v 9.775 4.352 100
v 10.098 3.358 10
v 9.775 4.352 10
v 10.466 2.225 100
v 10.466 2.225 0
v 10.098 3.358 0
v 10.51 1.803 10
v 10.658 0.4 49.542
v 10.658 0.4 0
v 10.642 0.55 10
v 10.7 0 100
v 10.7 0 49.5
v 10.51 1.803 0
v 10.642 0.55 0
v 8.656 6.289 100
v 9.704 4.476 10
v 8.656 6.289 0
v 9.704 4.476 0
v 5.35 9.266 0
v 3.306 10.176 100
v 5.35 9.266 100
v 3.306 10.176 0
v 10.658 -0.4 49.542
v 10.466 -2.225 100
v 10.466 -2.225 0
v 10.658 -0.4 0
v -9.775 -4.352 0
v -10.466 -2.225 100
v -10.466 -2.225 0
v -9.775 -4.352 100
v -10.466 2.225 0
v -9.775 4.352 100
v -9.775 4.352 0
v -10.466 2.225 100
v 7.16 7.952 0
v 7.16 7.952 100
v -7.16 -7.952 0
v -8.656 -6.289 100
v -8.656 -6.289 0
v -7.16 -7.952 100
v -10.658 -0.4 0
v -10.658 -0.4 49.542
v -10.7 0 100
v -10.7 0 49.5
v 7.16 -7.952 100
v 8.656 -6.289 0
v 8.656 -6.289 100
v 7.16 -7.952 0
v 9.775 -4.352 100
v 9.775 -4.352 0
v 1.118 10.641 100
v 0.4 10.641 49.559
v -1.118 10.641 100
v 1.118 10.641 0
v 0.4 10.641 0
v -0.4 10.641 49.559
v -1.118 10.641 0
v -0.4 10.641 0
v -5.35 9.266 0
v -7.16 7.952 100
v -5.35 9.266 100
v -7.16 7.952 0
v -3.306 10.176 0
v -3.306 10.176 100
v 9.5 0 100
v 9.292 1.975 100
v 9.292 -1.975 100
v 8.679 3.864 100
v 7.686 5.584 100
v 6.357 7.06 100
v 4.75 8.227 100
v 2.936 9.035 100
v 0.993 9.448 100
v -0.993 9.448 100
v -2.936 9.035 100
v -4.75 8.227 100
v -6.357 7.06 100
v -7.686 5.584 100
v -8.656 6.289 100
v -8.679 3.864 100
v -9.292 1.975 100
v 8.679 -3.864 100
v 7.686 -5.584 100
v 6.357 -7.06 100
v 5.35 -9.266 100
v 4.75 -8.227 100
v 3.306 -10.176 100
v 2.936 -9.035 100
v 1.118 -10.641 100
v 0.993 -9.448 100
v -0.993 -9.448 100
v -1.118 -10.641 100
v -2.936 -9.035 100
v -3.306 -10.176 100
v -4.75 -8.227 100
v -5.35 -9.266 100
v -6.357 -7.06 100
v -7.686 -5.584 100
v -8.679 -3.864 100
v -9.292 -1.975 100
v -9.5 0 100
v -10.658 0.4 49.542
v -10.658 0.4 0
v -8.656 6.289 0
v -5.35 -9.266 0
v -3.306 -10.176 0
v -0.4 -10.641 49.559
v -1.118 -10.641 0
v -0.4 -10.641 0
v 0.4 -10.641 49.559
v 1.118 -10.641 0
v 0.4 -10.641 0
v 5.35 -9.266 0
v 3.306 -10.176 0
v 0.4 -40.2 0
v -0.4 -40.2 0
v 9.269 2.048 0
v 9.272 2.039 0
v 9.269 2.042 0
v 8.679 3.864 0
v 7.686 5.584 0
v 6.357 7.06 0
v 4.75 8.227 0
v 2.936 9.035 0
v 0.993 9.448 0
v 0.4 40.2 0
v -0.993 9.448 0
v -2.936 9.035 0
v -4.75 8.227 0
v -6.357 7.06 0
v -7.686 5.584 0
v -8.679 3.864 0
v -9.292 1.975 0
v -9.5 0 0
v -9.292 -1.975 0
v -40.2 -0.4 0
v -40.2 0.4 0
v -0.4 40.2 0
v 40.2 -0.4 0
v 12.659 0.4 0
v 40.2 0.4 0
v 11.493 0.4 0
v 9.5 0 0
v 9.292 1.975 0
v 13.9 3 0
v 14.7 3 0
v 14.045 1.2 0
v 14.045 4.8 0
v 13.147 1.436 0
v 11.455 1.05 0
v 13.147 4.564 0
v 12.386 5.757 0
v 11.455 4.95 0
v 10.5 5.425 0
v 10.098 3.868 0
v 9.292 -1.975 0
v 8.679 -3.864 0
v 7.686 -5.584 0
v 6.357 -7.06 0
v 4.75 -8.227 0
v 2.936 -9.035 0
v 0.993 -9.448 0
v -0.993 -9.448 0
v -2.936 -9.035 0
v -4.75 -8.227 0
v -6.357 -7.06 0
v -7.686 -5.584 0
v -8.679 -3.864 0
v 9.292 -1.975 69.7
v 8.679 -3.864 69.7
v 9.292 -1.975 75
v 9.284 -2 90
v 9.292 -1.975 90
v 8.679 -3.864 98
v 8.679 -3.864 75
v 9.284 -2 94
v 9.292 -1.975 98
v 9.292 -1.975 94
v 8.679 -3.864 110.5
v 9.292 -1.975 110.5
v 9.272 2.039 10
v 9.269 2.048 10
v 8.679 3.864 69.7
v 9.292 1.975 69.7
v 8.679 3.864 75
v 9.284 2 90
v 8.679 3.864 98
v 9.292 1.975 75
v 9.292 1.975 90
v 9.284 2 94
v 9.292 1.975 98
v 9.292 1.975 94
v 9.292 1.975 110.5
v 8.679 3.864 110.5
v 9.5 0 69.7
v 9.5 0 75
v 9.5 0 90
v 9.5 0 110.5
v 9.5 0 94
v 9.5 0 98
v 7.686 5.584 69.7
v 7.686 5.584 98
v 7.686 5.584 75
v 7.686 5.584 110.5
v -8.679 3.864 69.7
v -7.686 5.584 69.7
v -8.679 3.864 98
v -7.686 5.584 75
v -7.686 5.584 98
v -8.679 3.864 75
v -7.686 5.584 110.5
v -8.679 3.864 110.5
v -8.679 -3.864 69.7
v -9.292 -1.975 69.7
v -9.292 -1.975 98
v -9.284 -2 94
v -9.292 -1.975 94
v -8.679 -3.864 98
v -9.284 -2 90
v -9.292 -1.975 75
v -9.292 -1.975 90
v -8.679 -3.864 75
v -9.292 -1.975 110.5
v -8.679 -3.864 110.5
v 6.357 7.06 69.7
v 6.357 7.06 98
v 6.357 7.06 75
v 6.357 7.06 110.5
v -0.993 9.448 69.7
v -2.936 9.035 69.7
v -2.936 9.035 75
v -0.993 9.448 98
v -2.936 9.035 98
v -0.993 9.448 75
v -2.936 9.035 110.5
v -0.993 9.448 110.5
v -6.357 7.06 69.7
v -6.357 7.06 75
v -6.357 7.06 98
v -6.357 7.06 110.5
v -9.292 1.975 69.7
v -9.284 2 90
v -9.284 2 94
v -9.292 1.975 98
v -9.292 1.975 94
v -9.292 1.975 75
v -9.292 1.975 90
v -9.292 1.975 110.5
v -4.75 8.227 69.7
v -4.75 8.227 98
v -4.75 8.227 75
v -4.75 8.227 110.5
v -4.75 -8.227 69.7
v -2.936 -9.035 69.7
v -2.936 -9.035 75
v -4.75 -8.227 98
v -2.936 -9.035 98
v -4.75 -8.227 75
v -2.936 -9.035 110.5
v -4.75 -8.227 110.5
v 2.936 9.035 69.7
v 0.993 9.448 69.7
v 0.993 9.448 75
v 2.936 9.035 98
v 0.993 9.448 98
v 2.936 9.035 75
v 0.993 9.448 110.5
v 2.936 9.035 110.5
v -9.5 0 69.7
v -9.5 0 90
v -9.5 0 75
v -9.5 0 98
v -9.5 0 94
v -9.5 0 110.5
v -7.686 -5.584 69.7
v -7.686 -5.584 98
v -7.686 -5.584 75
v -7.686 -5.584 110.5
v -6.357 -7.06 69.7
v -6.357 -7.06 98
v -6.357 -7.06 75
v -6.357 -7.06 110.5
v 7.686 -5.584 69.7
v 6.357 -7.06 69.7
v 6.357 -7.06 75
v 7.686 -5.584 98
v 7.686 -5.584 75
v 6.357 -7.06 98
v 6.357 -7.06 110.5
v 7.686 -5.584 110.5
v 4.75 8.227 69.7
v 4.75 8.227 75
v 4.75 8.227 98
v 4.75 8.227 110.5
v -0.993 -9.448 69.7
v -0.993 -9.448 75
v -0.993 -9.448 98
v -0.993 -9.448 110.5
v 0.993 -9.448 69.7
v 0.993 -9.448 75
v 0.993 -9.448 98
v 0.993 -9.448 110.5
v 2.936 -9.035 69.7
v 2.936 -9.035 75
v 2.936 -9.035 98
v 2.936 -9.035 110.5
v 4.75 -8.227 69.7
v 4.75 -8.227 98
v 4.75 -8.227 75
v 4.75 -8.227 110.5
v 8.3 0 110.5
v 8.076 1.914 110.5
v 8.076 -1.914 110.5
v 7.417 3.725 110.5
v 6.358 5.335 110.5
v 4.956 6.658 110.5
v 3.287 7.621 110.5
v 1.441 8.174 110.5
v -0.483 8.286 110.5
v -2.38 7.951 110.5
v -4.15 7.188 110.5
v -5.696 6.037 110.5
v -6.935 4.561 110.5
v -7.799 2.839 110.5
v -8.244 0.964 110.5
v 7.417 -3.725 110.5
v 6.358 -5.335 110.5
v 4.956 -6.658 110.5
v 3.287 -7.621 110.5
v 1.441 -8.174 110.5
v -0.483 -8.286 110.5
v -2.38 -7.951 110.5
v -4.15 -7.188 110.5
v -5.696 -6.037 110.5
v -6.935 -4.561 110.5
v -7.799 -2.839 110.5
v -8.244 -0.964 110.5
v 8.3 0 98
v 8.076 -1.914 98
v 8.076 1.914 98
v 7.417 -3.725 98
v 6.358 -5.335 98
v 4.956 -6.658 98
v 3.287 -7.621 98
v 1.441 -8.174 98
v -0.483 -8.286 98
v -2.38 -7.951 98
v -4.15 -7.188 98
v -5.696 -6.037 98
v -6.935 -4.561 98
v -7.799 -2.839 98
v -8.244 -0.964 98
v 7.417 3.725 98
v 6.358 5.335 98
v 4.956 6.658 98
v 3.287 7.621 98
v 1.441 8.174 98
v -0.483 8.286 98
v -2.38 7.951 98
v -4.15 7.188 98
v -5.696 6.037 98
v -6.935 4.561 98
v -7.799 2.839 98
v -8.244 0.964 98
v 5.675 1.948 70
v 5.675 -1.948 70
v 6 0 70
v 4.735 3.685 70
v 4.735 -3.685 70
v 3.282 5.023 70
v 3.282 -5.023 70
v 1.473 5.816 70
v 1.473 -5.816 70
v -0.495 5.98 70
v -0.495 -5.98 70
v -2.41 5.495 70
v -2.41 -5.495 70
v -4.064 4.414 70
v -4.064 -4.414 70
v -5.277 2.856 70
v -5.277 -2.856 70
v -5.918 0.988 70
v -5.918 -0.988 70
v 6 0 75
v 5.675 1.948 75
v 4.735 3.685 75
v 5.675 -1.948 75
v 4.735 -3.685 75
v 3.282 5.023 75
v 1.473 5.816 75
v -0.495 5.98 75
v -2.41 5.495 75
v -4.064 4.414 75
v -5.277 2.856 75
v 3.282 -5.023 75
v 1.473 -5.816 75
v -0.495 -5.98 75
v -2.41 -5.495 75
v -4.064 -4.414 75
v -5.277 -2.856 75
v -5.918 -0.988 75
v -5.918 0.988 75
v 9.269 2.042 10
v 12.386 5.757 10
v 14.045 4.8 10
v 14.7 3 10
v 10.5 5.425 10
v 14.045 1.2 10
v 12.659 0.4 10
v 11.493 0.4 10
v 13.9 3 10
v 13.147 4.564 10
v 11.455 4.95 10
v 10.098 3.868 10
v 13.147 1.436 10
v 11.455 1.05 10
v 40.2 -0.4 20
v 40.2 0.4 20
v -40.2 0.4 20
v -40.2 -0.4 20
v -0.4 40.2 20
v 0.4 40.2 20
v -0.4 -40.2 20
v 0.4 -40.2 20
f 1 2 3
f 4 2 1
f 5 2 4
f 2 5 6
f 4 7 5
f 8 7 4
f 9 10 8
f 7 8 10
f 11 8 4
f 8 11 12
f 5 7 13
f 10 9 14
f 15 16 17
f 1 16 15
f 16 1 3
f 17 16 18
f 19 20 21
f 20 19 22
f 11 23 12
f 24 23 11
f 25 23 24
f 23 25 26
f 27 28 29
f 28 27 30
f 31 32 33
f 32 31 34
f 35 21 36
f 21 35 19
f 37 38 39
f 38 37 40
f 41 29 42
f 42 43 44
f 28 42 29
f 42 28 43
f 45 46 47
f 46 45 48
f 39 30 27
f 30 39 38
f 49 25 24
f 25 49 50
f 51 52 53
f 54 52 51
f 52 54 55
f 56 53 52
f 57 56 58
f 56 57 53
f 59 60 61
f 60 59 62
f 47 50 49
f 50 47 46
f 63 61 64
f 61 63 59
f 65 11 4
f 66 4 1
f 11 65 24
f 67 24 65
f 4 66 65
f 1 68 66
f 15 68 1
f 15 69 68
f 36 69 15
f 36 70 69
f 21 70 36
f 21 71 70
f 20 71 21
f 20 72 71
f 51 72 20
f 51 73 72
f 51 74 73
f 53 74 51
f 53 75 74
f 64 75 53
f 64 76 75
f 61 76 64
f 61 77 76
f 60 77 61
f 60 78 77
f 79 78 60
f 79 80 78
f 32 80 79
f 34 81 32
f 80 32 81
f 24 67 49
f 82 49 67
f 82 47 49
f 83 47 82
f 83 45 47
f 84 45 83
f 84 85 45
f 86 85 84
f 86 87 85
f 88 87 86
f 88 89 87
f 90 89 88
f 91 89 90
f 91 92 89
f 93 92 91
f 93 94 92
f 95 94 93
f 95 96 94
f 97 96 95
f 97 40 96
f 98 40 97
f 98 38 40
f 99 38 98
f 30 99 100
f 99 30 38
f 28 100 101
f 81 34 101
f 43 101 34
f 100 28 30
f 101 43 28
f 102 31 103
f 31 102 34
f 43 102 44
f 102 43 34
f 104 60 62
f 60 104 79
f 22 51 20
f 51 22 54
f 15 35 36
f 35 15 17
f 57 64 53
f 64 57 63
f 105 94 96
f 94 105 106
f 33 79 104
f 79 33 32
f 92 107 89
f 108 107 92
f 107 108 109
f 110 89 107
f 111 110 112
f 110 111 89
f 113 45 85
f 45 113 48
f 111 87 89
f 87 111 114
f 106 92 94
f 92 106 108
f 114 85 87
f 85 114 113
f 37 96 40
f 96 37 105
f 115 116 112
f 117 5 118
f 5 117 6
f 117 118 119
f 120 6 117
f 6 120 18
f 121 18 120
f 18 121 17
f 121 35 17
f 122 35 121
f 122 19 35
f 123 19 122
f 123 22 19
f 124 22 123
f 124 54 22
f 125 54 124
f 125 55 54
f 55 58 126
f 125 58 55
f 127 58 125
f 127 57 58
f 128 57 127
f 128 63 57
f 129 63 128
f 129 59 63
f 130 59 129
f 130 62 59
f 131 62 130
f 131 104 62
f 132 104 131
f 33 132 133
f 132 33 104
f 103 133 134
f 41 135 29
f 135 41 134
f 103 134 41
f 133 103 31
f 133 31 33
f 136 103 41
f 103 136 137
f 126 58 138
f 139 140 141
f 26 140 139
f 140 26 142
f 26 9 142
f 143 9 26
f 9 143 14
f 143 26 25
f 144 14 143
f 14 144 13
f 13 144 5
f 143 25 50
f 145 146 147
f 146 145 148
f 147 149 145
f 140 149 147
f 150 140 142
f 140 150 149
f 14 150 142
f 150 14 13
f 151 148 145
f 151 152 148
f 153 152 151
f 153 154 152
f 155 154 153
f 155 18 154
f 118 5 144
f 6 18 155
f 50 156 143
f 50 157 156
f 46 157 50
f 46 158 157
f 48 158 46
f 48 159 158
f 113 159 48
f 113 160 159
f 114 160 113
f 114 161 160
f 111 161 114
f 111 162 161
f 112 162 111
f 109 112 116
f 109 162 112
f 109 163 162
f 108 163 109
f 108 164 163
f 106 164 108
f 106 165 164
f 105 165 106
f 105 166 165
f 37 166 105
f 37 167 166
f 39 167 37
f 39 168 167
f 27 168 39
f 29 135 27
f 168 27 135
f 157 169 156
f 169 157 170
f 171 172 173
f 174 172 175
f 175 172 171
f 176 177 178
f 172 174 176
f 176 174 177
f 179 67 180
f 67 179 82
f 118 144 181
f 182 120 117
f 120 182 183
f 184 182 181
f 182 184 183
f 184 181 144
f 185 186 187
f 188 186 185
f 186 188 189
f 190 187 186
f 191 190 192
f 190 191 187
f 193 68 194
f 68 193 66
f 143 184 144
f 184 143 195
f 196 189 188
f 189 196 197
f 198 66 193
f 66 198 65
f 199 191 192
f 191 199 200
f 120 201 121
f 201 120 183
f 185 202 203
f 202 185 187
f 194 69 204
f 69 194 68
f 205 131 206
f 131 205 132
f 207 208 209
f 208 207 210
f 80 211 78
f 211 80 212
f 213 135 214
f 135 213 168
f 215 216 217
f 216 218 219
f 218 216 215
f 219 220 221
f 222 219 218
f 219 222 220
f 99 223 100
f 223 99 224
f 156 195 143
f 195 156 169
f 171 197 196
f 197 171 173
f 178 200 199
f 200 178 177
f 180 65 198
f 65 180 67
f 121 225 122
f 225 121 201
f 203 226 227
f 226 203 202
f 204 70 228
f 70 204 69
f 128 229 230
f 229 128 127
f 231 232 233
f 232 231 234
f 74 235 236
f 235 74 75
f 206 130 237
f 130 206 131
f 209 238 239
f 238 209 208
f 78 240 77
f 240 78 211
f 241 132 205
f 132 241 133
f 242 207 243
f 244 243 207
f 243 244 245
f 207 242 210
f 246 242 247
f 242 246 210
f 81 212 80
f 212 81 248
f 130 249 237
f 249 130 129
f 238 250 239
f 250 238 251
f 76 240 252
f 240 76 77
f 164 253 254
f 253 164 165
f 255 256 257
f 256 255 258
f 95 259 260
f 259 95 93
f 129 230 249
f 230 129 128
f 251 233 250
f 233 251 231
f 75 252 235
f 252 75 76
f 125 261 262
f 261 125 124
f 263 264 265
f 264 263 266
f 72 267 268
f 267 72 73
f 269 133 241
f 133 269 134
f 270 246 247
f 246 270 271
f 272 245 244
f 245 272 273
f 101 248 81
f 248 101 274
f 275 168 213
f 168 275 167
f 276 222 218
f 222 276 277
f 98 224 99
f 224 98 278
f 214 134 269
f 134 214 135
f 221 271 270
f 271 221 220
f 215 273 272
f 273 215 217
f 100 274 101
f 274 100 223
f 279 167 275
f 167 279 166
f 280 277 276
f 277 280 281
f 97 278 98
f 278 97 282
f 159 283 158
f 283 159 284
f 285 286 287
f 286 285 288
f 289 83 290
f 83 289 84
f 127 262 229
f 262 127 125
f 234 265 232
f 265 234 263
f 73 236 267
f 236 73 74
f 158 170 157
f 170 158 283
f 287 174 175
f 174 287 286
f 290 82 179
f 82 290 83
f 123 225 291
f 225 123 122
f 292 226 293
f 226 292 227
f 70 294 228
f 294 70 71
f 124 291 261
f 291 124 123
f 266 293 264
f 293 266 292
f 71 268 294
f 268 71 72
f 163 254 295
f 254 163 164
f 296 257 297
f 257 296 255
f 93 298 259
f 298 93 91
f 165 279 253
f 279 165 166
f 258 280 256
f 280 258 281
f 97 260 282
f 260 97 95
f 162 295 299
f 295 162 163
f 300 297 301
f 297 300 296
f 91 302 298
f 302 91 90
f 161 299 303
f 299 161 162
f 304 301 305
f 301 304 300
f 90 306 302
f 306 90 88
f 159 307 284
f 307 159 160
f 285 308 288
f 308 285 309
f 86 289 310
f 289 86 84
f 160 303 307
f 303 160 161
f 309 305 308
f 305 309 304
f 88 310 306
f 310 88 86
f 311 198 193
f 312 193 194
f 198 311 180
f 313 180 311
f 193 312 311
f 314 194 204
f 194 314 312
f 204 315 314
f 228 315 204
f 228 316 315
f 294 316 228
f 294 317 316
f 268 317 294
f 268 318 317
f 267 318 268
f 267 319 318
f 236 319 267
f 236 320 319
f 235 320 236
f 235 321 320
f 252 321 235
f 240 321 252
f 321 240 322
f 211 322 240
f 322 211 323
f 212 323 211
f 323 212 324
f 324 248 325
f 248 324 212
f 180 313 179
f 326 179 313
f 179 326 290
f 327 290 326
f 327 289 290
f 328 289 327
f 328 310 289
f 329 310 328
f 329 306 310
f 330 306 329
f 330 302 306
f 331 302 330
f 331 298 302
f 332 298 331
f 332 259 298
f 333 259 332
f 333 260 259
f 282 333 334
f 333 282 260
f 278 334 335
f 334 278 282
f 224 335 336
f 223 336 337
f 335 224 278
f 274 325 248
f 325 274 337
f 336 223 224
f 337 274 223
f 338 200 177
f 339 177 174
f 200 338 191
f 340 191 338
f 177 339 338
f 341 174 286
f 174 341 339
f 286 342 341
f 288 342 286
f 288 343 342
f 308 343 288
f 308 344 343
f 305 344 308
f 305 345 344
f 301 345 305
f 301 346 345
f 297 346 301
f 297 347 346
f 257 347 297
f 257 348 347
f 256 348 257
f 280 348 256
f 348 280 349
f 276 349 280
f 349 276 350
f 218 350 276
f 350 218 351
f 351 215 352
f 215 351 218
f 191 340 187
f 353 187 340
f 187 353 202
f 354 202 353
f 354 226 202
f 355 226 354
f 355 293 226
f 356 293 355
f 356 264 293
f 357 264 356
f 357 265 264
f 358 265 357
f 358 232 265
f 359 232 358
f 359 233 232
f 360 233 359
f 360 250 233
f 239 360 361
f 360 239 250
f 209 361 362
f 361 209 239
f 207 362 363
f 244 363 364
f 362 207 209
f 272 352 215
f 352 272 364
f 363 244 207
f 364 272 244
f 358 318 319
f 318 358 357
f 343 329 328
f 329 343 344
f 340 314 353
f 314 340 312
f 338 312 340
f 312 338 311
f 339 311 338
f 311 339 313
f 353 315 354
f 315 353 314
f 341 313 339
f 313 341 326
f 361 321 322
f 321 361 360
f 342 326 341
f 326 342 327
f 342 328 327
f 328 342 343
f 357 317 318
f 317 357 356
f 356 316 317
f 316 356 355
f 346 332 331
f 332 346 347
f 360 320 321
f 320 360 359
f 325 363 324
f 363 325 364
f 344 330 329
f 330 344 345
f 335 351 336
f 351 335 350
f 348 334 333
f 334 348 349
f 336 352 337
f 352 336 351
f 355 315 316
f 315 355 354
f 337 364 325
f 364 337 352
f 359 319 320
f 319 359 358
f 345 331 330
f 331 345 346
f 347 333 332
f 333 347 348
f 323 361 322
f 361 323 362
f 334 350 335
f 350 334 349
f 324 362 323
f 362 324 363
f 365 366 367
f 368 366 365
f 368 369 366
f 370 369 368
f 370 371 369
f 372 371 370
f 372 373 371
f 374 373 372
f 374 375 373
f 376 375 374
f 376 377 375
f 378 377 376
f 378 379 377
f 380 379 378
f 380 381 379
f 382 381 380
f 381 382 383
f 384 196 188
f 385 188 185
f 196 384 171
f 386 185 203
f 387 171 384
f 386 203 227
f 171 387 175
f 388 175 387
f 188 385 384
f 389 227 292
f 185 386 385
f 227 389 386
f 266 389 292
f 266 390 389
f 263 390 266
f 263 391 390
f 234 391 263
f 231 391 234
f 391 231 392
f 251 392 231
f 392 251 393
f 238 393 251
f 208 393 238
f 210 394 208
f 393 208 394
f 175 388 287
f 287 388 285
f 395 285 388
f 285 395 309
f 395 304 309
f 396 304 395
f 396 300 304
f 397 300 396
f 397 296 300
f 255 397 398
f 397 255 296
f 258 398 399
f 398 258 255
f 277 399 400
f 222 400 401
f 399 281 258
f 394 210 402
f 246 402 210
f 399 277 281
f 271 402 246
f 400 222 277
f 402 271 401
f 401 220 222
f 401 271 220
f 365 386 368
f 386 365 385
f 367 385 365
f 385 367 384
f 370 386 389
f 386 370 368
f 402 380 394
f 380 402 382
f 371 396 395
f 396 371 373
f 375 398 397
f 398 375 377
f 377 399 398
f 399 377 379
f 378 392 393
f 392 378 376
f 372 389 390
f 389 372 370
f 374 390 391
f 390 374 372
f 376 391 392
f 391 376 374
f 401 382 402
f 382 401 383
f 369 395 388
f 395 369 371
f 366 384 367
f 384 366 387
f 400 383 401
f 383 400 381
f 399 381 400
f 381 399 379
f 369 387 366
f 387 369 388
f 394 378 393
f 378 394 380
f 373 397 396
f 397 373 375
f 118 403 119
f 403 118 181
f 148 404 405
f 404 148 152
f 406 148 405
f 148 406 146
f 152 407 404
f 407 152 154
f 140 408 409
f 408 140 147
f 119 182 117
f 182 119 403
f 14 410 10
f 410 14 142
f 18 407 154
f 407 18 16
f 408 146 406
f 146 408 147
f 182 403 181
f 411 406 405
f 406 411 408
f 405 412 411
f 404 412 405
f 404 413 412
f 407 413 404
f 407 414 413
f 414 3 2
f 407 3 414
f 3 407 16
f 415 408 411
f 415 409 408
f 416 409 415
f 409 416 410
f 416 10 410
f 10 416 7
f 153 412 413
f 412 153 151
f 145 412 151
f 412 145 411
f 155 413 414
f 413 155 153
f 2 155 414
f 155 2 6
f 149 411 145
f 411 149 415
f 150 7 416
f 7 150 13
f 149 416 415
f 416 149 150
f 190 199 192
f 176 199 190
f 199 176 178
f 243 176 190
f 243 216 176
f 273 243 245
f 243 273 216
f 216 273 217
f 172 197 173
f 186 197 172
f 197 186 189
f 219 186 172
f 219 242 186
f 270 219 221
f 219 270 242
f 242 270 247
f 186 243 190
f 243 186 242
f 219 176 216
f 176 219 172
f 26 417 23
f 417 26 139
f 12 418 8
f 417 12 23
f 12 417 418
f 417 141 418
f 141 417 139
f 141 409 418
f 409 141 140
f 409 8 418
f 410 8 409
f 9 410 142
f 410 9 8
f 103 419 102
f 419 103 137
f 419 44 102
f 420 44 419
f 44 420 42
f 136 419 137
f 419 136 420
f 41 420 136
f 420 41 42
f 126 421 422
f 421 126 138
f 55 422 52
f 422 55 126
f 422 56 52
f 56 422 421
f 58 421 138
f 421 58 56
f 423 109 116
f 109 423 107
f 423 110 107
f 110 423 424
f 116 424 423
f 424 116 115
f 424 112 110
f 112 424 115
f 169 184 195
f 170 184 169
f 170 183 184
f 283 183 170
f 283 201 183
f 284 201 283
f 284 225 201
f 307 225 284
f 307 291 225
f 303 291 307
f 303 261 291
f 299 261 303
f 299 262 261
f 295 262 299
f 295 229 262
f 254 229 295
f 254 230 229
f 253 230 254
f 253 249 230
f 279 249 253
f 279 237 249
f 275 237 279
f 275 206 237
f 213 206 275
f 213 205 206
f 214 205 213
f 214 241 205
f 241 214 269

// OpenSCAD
a=100; b=10.7;
module stupen () {
    difference () {
    cylinder(a,b,b);
    translate ([0,0,-1]) cylinder (a+2,b-1.2,b-1.2);
}}

module spojkavolna () {
    difference () {
    translate ([0,0,98]) cylinder (a/8,9.5,9.5);
    translate ([0,0,97]) cylinder (a/8+2,8.3,8.3);
    }}

module zarazka () {
    difference () {
    translate ([0,0,70]) cylinder (5,9.5,9.5);
    translate ([0,0,69]) cylinder (7,6,6);
    }}
translate ([0,0,69.7]) cylinder (0.3,9.5,9.5);

module prepazka () {
    translate ([-9.5,-2,90]) cube ([19,4,4]);
}

module hand (scale=10) {
    rotate ([90,0,0]) linear_extrude(height = scale*0.08, center = true)
    polygon (points=[[0,0],[0,50],[30,20],[30,0]]);
}

module uchyt () {
    difference () {
    translate ([11.9,3,0]) cylinder (10,2.8,2.8);
    translate ([11.9,3,-1]) cylinder (12,2,2);
}}

union () {
    stupen();
    spojkavolna();
    zarazka ();
    prepazka ();
    translate ([10.2,0,0]) hand();
    translate ([-10.2,0,0]) rotate (180) hand();
    translate ([0,10.2,0]) rotate (90) hand();
    translate ([0,-10.2,0]) rotate (270) hand();
    uchyt ();
} ;
